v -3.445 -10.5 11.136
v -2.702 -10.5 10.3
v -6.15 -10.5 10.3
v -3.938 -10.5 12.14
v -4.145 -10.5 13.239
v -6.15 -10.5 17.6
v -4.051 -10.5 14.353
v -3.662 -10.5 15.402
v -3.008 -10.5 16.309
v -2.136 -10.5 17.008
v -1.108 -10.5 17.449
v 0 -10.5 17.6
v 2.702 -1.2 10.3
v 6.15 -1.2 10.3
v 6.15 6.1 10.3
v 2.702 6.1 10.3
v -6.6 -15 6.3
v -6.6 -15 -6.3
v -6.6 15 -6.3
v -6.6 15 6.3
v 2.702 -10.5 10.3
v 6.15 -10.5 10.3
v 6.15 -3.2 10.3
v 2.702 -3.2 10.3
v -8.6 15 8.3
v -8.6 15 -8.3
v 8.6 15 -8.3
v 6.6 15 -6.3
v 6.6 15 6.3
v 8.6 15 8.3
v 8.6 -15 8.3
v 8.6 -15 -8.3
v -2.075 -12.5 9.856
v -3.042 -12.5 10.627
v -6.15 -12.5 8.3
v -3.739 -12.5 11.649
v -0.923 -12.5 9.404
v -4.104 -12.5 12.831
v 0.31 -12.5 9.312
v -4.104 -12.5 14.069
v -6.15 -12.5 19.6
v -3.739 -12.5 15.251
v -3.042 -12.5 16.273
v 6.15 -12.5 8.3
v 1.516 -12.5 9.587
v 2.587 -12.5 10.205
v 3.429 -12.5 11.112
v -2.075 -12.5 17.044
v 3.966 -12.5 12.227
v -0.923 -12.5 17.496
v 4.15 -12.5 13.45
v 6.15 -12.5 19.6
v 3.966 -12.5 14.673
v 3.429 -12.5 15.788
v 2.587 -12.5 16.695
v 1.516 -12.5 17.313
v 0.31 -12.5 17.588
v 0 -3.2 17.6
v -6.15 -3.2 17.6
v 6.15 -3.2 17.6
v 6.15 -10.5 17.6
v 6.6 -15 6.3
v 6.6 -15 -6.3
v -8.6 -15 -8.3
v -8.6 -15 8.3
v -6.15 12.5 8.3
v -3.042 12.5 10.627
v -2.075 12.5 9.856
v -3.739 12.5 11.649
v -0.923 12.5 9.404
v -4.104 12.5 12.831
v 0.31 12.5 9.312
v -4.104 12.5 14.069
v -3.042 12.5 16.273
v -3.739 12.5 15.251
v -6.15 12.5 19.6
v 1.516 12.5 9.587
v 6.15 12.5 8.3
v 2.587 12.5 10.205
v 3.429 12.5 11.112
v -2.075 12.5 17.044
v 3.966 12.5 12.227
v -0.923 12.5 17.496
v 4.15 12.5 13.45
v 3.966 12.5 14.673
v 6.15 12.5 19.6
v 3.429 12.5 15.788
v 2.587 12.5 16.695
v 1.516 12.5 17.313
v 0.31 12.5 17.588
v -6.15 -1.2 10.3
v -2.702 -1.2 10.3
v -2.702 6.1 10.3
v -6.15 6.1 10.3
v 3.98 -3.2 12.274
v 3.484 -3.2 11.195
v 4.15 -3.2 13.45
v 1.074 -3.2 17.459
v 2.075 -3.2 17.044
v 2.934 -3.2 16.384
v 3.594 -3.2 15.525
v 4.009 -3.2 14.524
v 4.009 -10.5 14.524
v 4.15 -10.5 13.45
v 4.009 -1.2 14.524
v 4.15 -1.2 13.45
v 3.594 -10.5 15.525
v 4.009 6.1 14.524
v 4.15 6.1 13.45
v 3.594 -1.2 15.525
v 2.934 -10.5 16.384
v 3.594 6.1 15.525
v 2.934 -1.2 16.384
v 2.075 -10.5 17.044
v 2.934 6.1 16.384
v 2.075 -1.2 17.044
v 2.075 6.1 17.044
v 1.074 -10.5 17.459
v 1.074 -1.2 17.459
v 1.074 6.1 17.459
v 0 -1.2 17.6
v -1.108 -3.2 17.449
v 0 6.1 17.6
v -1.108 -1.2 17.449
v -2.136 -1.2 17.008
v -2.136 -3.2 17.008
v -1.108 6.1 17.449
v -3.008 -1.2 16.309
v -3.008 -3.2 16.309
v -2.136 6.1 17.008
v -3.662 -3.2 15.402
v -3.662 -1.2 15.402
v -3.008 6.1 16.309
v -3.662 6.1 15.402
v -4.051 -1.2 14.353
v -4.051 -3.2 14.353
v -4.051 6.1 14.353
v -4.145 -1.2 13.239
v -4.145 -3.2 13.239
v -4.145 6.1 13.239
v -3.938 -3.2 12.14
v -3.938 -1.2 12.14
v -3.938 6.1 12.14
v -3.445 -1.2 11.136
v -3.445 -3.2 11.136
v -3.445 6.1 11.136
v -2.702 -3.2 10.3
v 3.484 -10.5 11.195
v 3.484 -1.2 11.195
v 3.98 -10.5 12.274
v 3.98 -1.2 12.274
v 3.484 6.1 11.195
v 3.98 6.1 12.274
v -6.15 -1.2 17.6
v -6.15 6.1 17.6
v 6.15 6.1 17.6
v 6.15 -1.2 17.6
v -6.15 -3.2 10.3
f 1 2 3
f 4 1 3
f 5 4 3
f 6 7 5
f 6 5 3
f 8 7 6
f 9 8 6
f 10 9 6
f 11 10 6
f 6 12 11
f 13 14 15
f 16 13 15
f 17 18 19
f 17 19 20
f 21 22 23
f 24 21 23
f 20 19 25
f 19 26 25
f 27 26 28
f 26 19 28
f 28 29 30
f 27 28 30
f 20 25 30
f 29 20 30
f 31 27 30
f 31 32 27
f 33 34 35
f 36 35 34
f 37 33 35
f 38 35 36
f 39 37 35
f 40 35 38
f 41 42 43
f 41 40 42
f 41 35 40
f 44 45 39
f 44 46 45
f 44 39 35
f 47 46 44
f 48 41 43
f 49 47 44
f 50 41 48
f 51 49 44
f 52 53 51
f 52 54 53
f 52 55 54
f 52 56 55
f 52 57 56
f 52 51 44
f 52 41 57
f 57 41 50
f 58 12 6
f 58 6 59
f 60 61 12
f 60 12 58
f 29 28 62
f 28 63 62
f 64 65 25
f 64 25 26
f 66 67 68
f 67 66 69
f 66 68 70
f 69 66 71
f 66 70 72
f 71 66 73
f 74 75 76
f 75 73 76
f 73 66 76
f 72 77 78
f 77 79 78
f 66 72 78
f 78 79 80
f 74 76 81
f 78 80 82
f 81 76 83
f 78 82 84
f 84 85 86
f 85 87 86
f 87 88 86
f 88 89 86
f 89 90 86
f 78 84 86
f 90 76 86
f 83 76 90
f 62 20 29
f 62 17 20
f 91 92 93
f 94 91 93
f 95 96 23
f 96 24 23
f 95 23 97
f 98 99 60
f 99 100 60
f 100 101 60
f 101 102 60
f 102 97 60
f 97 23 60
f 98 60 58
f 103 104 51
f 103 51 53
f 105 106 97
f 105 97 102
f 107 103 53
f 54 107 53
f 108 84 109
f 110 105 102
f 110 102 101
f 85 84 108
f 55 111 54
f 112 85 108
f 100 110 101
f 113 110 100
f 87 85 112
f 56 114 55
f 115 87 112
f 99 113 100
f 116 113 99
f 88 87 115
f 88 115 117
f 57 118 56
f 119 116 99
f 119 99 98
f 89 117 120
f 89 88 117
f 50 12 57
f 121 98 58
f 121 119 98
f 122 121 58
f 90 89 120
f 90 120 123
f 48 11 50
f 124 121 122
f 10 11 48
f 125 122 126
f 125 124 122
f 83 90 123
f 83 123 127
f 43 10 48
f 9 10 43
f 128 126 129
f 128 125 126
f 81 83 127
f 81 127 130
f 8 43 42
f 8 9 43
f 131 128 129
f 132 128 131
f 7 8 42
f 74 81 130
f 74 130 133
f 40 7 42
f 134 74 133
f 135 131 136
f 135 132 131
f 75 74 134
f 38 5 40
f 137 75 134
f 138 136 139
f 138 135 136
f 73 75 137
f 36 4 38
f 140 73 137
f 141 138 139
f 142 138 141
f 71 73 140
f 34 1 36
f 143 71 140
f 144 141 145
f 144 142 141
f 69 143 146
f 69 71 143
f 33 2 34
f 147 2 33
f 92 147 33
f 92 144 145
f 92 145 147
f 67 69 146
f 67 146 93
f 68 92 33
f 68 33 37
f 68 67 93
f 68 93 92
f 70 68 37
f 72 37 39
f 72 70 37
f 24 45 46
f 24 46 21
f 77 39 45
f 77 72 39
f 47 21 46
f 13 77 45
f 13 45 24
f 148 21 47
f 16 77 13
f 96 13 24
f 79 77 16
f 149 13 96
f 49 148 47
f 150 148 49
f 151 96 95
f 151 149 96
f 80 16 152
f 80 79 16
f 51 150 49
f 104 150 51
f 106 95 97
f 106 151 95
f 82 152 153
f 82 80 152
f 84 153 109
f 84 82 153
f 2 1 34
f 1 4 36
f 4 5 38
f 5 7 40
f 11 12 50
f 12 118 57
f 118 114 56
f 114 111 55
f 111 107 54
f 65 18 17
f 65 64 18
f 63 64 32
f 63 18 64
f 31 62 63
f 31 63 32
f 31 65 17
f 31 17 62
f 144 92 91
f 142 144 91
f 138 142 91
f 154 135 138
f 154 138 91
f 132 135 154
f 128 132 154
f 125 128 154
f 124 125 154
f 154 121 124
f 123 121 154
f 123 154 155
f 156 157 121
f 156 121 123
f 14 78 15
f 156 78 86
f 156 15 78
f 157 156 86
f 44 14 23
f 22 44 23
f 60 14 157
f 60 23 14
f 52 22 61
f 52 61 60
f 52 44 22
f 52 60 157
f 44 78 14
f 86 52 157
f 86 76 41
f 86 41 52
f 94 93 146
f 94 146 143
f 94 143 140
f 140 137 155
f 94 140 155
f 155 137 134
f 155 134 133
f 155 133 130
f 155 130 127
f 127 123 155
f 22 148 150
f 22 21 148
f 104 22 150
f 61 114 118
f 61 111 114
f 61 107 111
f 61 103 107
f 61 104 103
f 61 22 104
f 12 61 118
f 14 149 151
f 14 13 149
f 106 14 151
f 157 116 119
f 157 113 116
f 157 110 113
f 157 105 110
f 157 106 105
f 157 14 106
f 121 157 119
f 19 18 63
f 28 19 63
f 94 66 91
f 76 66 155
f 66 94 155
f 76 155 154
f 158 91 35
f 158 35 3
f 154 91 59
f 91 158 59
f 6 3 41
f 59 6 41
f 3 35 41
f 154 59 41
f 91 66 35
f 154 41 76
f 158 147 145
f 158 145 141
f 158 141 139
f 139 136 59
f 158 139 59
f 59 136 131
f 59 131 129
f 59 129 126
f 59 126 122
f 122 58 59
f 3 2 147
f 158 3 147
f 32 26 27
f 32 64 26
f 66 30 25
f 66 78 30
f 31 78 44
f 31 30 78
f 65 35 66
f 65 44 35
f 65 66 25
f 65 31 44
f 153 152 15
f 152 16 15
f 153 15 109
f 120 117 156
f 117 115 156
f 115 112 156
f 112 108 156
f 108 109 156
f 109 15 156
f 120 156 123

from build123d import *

# Parameters (mm, degrees)
F0_W     = 13.2
F0_H     = 12.6
F1_DEPTH = 15
F0_W_2   = 12.3
F0_H_2   = 11.3
F0_R     = 4.15
F2_DEPTH = 12.5
F3_W     = 7.3
F3_H     = 7.3
F3_W_2   = 7.299999
F4_DEPTH = 25


with BuildPart() as f1:
    # F0 (on Front) → F1 (new body, symmetric)
    with BuildSketch(Plane.XZ):
        Polygon((8.6, -8.3), (8.6, 8.3), (6.15, 8.3), (-6.15, 8.3), (-8.6, 8.3), (-8.6, -8.3), align=None)
        Rectangle(F0_W, F0_H, mode=Mode.SUBTRACT)
    extrude(amount=F1_DEPTH, both=True)

    # F0 (on Front) → F2 (join, symmetric)
    with BuildSketch(Plane.XZ):
        with Locations((0, 13.95)):
            Rectangle(F0_W_2, F0_H_2)
        with Locations((0, 13.45)):
            Circle(F0_R, mode=Mode.SUBTRACT)
    extrude(amount=F2_DEPTH, both=True)

    # F3 (on face) → F4 (cut)
    with BuildSketch(Plane.YZ.offset(6.15)):
        with Locations((-6.85, 13.95)):
            Rectangle(F3_W, F3_H)
        with Locations((2.449999, 13.95)):
            Rectangle(F3_W_2, F3_H)
    extrude(amount=-F4_DEPTH, mode=Mode.SUBTRACT)


solid = f1.part
